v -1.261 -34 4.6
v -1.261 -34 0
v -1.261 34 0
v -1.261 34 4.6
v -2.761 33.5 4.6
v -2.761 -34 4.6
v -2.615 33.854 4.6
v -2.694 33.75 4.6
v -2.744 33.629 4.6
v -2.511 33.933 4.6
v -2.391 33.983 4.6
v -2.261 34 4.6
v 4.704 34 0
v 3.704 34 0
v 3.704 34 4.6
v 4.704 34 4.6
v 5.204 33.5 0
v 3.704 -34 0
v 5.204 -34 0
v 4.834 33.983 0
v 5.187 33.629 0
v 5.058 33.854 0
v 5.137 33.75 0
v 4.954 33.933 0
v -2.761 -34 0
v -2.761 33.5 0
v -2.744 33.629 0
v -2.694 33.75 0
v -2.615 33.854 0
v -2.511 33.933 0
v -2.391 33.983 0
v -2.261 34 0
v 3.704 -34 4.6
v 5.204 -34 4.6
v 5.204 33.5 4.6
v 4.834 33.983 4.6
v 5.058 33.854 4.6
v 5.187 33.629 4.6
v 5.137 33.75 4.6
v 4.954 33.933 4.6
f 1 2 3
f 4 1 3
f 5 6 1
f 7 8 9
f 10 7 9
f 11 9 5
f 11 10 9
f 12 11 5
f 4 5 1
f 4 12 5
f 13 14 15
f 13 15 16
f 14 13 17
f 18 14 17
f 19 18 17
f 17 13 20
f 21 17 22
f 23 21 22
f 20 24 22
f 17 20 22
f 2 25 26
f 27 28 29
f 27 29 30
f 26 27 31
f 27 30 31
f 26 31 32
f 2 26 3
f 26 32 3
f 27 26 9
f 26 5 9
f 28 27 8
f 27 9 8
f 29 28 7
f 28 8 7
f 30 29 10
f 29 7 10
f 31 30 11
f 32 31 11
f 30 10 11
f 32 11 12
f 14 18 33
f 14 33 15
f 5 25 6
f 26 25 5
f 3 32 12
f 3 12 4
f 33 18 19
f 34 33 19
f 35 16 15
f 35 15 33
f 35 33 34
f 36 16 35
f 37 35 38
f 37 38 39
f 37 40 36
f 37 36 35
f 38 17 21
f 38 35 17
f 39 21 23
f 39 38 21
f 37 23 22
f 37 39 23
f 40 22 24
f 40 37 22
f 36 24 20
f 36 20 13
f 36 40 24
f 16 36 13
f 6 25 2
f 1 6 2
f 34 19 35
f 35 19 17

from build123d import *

# Parameters (mm, degrees)
F0_W     = 1.5
F0_H     = 68
F1_DEPTH = 4.6
F2_R     = 0.5


with BuildPart() as f1:
    # F0 (on Top) → F1 (new body)
    with BuildSketch(Plane.XY):
        with Locations((-2.011391, 0)):
            Rectangle(F0_W, F0_H)
        with Locations((4.454094, 0)):
            Rectangle(F0_W, F0_H)
    extrude(amount=F1_DEPTH)

    # F2
    f2_edges = [f1.edges().sort_by_distance(p)[0] for p in [
        (-2.761391, 34, 2.3),
        (5.204094, 34, 2.3),
    ]]
    fillet(f2_edges, radius=F2_R)


solid = f1.part
